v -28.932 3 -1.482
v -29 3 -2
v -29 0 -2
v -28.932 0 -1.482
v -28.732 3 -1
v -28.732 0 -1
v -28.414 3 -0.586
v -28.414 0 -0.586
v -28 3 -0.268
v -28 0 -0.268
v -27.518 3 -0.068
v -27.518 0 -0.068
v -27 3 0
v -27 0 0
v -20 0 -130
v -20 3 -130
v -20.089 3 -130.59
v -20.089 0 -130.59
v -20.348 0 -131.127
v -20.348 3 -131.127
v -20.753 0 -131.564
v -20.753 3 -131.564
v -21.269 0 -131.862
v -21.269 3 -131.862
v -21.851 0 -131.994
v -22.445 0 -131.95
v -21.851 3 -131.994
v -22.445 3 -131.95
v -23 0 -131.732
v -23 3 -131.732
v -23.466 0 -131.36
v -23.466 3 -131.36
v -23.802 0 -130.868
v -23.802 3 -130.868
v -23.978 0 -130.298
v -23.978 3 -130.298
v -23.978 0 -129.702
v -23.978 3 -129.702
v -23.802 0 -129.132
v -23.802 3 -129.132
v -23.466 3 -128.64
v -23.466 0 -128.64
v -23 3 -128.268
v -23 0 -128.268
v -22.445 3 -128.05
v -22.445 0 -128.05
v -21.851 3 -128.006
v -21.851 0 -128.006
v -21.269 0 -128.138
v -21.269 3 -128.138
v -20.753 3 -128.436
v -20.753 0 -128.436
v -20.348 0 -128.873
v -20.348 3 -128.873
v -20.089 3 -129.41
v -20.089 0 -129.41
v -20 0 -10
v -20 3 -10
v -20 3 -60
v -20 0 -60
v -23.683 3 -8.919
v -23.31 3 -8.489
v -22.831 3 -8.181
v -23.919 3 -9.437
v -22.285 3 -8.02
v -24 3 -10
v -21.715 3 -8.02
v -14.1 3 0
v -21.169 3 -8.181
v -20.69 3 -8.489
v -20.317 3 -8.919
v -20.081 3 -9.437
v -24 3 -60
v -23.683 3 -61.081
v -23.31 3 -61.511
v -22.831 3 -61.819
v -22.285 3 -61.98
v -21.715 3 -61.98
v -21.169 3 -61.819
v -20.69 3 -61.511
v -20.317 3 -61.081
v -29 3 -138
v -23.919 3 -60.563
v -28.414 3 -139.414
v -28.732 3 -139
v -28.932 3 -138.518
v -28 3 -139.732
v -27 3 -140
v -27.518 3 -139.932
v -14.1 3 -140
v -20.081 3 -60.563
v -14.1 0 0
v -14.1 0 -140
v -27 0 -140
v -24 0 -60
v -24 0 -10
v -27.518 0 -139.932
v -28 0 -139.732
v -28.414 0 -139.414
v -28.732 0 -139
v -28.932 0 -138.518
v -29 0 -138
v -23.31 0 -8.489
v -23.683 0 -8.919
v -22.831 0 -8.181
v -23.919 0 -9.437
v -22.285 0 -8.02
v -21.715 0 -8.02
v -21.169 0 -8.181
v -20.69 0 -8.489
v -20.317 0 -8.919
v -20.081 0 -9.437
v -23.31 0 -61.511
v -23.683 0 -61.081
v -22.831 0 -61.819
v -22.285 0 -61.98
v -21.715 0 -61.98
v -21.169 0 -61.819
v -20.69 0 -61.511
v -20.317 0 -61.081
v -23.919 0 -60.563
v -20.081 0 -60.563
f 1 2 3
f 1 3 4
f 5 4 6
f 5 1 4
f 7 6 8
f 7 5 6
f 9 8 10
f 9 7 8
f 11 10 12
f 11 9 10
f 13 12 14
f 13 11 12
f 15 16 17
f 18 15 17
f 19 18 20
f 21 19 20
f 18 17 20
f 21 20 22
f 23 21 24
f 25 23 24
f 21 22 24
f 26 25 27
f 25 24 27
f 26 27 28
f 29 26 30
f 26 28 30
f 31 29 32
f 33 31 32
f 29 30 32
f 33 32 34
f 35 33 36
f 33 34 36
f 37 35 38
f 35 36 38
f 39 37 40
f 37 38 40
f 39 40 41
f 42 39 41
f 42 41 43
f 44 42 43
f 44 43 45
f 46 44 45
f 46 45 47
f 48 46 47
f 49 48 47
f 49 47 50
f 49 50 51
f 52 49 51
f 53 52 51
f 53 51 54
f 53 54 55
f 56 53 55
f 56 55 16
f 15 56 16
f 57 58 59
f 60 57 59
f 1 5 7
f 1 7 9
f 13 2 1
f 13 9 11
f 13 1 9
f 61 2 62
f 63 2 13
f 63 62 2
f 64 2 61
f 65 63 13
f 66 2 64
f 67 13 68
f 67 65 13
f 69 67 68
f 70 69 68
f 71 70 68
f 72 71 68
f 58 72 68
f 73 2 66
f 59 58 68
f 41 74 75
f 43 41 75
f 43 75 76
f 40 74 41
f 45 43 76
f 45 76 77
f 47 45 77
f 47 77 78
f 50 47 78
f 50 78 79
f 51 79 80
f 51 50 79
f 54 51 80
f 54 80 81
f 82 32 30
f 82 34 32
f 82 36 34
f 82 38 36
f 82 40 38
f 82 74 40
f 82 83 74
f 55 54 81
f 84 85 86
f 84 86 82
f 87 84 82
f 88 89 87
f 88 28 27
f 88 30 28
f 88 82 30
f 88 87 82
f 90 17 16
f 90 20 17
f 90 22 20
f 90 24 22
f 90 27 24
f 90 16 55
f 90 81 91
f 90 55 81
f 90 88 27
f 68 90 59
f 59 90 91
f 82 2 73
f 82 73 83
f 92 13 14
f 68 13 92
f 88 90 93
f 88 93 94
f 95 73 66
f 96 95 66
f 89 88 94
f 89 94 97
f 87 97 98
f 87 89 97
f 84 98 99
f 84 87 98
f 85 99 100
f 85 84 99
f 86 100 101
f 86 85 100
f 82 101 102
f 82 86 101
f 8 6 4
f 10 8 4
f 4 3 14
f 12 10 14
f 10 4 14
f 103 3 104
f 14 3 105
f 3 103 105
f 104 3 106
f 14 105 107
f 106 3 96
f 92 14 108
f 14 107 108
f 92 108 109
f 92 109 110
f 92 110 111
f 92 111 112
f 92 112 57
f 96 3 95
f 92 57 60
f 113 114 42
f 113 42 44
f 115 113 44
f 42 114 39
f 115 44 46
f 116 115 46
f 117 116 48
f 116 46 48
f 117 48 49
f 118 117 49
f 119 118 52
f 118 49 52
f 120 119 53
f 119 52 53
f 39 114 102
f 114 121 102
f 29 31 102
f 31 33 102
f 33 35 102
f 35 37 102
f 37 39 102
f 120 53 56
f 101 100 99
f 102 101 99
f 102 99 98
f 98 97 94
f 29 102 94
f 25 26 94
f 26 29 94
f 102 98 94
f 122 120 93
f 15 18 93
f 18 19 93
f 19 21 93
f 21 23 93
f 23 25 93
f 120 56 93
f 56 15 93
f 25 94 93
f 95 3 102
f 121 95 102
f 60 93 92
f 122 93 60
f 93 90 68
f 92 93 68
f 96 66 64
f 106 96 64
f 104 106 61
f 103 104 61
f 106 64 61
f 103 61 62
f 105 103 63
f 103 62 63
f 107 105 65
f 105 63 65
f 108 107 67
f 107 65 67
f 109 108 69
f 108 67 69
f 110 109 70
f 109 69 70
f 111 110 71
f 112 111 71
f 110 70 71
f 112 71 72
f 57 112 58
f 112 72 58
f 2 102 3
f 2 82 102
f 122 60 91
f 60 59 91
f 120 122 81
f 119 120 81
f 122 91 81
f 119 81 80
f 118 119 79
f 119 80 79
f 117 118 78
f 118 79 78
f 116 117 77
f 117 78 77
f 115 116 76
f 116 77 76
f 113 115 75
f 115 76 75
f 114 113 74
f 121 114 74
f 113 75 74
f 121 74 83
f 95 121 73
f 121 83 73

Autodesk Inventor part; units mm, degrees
ref_plane "YZ Plane" through (0, 0, 0) normal (1, 0, 0) x (0, 1, 0)
ref_plane "XZ Plane" through (0, 0, 0) normal (0, 1, 0) x (-1, 0, 0)
ref_plane "XY Plane" through (0, 0, 0) normal (0, 0, 1) x (1, 0, 0)
sketch "草圖1" plane through (0, 0, 0) normal (0, 1, 0) x (-1, 0, 0)
  line L0 (0, 0) -> (0, -140)
  line L1 (15, -140) -> (15, 0)
  line L2 (6, 0) -> (6, 3)
  line L3 (6, 3) -> (14.1, 3)
  line L4 (14.1, 3) -> (14.1, 0)
  line L5 (15, 0) -> (14.1, 0)
  line L6 (6, 0) -> (0, 0)
  line L7 (6, -140) -> (6, -143)
  line L8 (6, -143) -> (14.1, -143)
  line L9 (14.1, -143) -> (14.1, -140)
  line L10 (0, -140) -> (6, -140)
  line L11 (14.1, -140) -> (15, -140)
  dimension "d1" = 15
  dimension "d2" = 3
  dimension "d3" = 8.1
  dimension "d4" = 6
  dimension "d5" = 3
  dimension "d6" = 140
  dimension "d7" = 6
  dimension "d8" = 8.1
  dimension "d9" = 15
  dimension "d10" = 140
extrude "擠出1" add sketch "草圖1" along normal blind 3
sketch "草圖2" plane through (0, 3, 0) normal (0, 1, 0) x (1, 0, 0)
  line L0 (-11, 1) -> (-8, 1)
  line L1 (-8, 1) -> (-8, 7)
  line L2 (-8, 7) -> (-11, 7)
  line L3 (-11, 7) -> (-11, 1)
  line L4 (0, 0) -> (0, 140) projected
  line L5 (-6, 0) -> (0, 0) projected
  line L6 (-11, 133) -> (-8, 133)
  line L7 (-8, 133) -> (-8, 139)
  line L8 (-8, 139) -> (-11, 139)
  line L9 (-11, 139) -> (-11, 133)
  line L10 (0, 140) -> (-6, 140) projected
  line L11 (-15, 140) -> (-15, 0) projected
  dimension "d13" = 6
  dimension "d14" = 3
  dimension "d16" = 1
  dimension "d17" = 6
  dimension "d18" = 3
  dimension "d20" = 1
  dimension "d33" = 4
  dimension "d34" = 4
extrude "擠出2" cut sketch "草圖2" against normal up to surface (3 mm away)
sketch "草圖4" plane through (0, 3, 0) normal (0, 1, 0) x (1, 0, 0)
  line L0 (-27, 0) -> (-15, 0)
  line L1 (-15, 0) -> (-15, 140)
  line L2 (-15, 140) -> (-27, 140)
  line L3 (-29, 138) -> (-29, 2)
  line L4 (-15, 140) -> (-15, 0) projected
  line L5 (0, 140) -> (-6, 140) projected
  line L6 (-6, 0) -> (0, 0) projected
  line L7 (-22, 10) -> (-22, 60) construction
  line L8 (-20, 10) -> (-20, 60)
  line L9 (-24, 60) -> (-24, 10)
  arc A0 (-24, 10) -> (-20, 10) centre (-22, 10) ccw
  arc A1 (-20, 60) -> (-24, 60) centre (-22, 60) ccw
  circle A2 centre (-22, 130) radius 2
  arc A3 (-29, 2) -> (-27, 0) centre (-27, 2) ccw
  arc A4 (-27, 140) -> (-29, 138) centre (-27, 138) ccw
  point P0 (-22, 35)
  dimension "d23" = 14
  dimension "d24" = 4
  dimension "d25" = 50
  dimension "d26" = 5
  dimension "d27" = 10
  dimension "d29" = 2
  dimension "d32" = 10
extrude "擠出3" add sketch "草圖4" against normal up to surface (3 mm away)
sketch "草圖6" plane through (0, 3, 0) normal (0, 1, 0) x (1, 0, 0)
  circle A0 centre (-22, 130) radius 2 projected
  arc A1 (-24, 10) -> (-20, 10) centre (-22, 10) ccw projected
  line L0 (-24, 10) -> (-24, 60) projected
  arc A2 (-20, 60) -> (-24, 60) centre (-22, 60) ccw projected
  line L1 (-20, 60) -> (-20, 10) projected
  line L2 (-8, 7) -> (-8, 1) projected
  line L3 (-8, 1) -> (-11, 1) projected
  line L4 (-11, 1) -> (-11, 7) projected
  line L5 (-11, 7) -> (-8, 7) projected
  line L6 (-8, 133) -> (-11, 133) projected
  line L7 (-11, 133) -> (-11, 139) projected
  line L8 (-11, 139) -> (-8, 139) projected
  line L9 (-8, 139) -> (-8, 133) projected
  line L10 (0, 0) -> (0, 140) projected
  line L11 (0, 140) -> (-6, 140) projected
  line L12 (-6, 140) -> (-6, 143) projected
  line L13 (-6, 143) -> (-14.1, 143) projected
  line L14 (-14.1, 143) -> (-14.1, 140) projected
  line L15 (-14.1, 140) -> (-27, 140) projected
  arc A3 (-27, 140) -> (-29, 138) centre (-27, 138) ccw projected
  line L16 (-29, 138) -> (-29, 2) projected
  arc A4 (-29, 2) -> (-27, 0) centre (-27, 2) ccw projected
  line L17 (-27, 0) -> (-14.1, 0) projected
  line L18 (-14.1, 0) -> (-14.1, -3) projected
  line L19 (-14.1, -3) -> (-6, -3) projected
  line L20 (-6, -3) -> (-6, 0) projected
  line L21 (-6, 0) -> (0, 0) projected
  line L22 (-6, 140) -> (-6, 143) projected
  line L23 (-6, 0) -> (-6, 140)
extrude "擠出4" cut sketch "草圖6" against normal blind 3 contours L21 L23 L11 L10
ref_plane "工作平面1" through (-22, 3, -10) normal (1, 0, 0) x (0, 0, -1)
sketch "草圖8" plane through (0, 3, 0) normal (0, 1, 0) x (1, 0, 0)
  line L0 (-14.1, 140) -> (-27, 140) projected
  line L1 (-14.1, 140) -> (-14.1, 0)
  line L2 (-6, -3) -> (-6, 143) projected
  line L3 (-6, 143) -> (-14.1, 143) projected
  line L4 (-14.1, 143) -> (-14.1, 140) projected
  line L5 (-14.1, 140) -> (-27, 140) projected
  arc A0 (-27, 140) -> (-29, 138) centre (-27, 138) ccw projected
  line L6 (-29, 138) -> (-29, 2) projected
  arc A1 (-29, 2) -> (-27, 0) centre (-27, 2) ccw projected
  line L7 (-27, 0) -> (-14.1, 0) projected
  line L8 (-14.1, 0) -> (-14.1, -3) projected
  line L9 (-14.1, -3) -> (-6, -3) projected
  circle A2 centre (-22, 130) radius 2 projected
  arc A3 (-24, 10) -> (-20, 10) centre (-22, 10) ccw projected
  line L10 (-24, 10) -> (-24, 60) projected
  arc A4 (-20, 60) -> (-24, 60) centre (-22, 60) ccw projected
  line L11 (-20, 60) -> (-20, 10) projected
  line L12 (-8, 7) -> (-8, 1) projected
  line L13 (-8, 1) -> (-11, 1) projected
  line L14 (-11, 1) -> (-11, 7) projected
  line L15 (-11, 7) -> (-8, 7) projected
  line L16 (-8, 133) -> (-11, 133) projected
  line L17 (-11, 133) -> (-11, 139) projected
  line L18 (-11, 139) -> (-8, 139) projected
  line L19 (-8, 139) -> (-8, 133) projected
  point P0 (0, 0)
extrude "擠出5" cut sketch "草圖8" against normal up to surface (3 mm away) contours L4 L3 L2 L9 L8 L1
equation "\"d10\" = d6"
equation "\"d20\" = d16"
properties part number "chassis_1_2_up"
